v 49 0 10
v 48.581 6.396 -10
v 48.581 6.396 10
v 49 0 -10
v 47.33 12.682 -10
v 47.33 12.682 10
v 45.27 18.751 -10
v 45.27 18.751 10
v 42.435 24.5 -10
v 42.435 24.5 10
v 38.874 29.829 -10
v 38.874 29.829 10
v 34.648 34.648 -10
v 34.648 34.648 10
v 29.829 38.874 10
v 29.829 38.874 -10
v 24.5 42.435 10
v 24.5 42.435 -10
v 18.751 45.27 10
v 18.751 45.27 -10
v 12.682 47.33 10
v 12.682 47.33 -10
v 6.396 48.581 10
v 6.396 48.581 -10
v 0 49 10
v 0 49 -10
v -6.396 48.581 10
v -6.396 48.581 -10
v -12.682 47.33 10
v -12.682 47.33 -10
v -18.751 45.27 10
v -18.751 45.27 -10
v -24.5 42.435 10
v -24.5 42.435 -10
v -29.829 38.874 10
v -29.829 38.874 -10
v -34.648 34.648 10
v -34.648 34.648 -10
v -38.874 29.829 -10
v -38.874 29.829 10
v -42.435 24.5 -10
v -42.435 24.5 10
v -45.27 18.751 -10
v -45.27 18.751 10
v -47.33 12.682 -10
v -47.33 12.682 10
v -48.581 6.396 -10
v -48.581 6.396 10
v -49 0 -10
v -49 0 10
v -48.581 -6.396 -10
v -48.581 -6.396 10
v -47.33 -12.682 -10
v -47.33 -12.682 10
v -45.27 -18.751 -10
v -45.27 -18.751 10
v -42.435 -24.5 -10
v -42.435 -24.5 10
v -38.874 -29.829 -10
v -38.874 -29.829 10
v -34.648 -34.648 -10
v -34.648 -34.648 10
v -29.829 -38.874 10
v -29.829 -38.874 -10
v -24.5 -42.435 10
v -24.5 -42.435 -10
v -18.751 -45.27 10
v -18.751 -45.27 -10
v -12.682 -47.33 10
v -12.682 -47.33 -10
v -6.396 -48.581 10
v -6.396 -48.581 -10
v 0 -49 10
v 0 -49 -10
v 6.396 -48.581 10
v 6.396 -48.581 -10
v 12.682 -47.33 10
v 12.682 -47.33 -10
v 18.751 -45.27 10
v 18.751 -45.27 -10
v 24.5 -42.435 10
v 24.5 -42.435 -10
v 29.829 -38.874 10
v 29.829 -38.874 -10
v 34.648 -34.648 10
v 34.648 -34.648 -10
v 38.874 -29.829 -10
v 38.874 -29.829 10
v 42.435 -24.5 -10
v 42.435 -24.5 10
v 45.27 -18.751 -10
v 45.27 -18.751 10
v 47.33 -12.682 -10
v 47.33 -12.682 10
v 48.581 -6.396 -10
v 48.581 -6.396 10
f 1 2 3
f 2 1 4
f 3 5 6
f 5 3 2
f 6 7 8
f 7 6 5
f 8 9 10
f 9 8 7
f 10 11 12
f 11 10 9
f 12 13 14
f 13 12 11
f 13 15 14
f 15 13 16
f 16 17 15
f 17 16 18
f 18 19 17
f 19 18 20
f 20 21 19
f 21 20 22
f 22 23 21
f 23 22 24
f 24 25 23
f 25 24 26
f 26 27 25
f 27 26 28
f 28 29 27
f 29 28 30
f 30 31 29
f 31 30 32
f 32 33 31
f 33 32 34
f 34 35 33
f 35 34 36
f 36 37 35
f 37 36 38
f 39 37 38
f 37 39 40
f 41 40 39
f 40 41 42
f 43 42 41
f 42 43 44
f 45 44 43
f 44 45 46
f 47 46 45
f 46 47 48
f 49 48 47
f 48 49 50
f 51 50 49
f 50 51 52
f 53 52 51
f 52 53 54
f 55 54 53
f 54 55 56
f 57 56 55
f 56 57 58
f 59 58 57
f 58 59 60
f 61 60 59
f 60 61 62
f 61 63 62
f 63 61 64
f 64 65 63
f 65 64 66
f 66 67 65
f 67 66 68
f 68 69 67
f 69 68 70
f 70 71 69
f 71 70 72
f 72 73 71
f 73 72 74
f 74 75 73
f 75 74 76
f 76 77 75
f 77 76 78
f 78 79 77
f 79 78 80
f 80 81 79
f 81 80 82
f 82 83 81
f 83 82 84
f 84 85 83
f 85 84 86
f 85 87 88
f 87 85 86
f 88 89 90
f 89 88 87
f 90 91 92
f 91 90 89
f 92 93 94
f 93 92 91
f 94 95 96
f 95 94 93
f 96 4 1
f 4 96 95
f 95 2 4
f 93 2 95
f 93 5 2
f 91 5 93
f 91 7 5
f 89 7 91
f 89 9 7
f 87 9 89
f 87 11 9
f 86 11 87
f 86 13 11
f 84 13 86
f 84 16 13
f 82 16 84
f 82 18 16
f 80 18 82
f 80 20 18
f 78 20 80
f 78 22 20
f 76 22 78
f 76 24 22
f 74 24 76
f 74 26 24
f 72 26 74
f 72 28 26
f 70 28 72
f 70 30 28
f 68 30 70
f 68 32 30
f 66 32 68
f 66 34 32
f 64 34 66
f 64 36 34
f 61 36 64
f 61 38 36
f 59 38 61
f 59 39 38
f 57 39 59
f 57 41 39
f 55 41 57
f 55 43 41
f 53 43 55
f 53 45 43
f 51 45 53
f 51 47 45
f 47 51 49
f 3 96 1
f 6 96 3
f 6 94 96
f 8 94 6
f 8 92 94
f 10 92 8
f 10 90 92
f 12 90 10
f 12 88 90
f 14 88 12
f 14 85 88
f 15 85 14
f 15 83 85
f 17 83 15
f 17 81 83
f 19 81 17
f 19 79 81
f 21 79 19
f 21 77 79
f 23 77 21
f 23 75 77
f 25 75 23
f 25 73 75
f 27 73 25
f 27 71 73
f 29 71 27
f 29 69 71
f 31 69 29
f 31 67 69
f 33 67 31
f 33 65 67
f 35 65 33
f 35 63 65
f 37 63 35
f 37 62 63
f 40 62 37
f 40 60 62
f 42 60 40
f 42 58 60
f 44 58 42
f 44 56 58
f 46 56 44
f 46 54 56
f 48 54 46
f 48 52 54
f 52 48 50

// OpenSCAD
// ========================================
// a cylinder with radius 49 mm and height 20 mm
// NeuroCAD canonical IR; dimensions are millimetres
// ========================================
$fn = 48;

cylinder(r=49, h=20, center=true);
